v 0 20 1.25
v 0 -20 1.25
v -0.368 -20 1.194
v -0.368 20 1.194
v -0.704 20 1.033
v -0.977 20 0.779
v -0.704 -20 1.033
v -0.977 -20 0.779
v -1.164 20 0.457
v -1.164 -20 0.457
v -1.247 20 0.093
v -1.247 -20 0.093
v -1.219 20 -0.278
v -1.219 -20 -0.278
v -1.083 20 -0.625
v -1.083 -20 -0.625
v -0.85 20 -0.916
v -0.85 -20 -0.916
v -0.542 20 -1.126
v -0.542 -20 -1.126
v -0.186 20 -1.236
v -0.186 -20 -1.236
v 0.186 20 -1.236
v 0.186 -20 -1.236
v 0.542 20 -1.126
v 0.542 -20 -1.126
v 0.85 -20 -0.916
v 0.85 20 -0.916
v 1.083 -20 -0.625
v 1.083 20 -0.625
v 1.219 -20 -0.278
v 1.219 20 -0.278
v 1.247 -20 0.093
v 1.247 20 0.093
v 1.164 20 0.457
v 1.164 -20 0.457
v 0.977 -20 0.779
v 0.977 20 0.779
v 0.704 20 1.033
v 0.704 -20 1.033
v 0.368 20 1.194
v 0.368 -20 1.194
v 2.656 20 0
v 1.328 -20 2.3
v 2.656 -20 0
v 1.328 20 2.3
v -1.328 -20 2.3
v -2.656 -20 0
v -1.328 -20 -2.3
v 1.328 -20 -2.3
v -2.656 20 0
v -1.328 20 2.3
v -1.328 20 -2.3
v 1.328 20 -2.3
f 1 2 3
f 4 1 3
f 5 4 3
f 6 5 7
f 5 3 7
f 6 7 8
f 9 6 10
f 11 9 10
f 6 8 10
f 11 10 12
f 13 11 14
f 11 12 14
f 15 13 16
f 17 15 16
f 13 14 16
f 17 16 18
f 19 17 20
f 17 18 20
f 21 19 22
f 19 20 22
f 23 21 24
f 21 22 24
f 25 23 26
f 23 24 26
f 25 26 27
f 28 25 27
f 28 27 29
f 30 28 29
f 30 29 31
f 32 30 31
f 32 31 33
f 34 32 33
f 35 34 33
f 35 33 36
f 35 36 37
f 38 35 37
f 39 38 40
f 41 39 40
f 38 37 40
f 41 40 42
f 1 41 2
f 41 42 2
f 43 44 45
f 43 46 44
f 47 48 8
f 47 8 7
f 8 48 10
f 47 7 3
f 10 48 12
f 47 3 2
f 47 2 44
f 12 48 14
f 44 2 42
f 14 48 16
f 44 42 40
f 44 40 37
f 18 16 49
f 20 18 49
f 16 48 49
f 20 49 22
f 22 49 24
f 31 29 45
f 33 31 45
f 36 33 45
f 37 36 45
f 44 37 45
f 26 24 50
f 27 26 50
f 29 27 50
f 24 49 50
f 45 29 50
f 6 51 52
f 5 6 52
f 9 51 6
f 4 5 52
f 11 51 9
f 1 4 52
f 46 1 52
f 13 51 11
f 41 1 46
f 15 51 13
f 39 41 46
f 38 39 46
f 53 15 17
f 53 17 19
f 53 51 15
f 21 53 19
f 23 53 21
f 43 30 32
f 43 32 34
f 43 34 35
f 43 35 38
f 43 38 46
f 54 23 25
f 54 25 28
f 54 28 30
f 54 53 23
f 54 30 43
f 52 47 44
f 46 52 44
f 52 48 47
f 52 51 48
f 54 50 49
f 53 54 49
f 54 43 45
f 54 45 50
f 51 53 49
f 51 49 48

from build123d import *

# Parameters (mm, degrees)
EXTRUDE_1_DEPTH = 20
SKETCH_3_W      = 1.25
SKETCH_3_H      = 40.001


with BuildPart() as part:
    # 草图1 → 凸台-拉伸1 (new, symmetric)
    with BuildSketch(Plane(origin=(0, 0, 0), x_dir=(1, 0, 0), z_dir=(0, 1, 0))):
        Polygon((1.327905619, -2.3), (2.655811238, 0), (1.327905619, 2.3), (-1.327905619, 2.3), (-2.655811238, 0), (-1.327905619, -2.3), align=None)
    extrude(amount=EXTRUDE_1_DEPTH, both=True)

    # 草图3 → M3 螺纹孔1 (revolve, cut)
    with BuildSketch(Plane(origin=(0, 20, 0), x_dir=(0, 0, 1), z_dir=(1, 0, 0))):
        with Locations((0.625, 20.0005)):
            Rectangle(SKETCH_3_W, SKETCH_3_H)
    revolve(axis=Axis((0, 26.35, 0), (0, -1, 0)), mode=Mode.SUBTRACT)


solid = part.part
